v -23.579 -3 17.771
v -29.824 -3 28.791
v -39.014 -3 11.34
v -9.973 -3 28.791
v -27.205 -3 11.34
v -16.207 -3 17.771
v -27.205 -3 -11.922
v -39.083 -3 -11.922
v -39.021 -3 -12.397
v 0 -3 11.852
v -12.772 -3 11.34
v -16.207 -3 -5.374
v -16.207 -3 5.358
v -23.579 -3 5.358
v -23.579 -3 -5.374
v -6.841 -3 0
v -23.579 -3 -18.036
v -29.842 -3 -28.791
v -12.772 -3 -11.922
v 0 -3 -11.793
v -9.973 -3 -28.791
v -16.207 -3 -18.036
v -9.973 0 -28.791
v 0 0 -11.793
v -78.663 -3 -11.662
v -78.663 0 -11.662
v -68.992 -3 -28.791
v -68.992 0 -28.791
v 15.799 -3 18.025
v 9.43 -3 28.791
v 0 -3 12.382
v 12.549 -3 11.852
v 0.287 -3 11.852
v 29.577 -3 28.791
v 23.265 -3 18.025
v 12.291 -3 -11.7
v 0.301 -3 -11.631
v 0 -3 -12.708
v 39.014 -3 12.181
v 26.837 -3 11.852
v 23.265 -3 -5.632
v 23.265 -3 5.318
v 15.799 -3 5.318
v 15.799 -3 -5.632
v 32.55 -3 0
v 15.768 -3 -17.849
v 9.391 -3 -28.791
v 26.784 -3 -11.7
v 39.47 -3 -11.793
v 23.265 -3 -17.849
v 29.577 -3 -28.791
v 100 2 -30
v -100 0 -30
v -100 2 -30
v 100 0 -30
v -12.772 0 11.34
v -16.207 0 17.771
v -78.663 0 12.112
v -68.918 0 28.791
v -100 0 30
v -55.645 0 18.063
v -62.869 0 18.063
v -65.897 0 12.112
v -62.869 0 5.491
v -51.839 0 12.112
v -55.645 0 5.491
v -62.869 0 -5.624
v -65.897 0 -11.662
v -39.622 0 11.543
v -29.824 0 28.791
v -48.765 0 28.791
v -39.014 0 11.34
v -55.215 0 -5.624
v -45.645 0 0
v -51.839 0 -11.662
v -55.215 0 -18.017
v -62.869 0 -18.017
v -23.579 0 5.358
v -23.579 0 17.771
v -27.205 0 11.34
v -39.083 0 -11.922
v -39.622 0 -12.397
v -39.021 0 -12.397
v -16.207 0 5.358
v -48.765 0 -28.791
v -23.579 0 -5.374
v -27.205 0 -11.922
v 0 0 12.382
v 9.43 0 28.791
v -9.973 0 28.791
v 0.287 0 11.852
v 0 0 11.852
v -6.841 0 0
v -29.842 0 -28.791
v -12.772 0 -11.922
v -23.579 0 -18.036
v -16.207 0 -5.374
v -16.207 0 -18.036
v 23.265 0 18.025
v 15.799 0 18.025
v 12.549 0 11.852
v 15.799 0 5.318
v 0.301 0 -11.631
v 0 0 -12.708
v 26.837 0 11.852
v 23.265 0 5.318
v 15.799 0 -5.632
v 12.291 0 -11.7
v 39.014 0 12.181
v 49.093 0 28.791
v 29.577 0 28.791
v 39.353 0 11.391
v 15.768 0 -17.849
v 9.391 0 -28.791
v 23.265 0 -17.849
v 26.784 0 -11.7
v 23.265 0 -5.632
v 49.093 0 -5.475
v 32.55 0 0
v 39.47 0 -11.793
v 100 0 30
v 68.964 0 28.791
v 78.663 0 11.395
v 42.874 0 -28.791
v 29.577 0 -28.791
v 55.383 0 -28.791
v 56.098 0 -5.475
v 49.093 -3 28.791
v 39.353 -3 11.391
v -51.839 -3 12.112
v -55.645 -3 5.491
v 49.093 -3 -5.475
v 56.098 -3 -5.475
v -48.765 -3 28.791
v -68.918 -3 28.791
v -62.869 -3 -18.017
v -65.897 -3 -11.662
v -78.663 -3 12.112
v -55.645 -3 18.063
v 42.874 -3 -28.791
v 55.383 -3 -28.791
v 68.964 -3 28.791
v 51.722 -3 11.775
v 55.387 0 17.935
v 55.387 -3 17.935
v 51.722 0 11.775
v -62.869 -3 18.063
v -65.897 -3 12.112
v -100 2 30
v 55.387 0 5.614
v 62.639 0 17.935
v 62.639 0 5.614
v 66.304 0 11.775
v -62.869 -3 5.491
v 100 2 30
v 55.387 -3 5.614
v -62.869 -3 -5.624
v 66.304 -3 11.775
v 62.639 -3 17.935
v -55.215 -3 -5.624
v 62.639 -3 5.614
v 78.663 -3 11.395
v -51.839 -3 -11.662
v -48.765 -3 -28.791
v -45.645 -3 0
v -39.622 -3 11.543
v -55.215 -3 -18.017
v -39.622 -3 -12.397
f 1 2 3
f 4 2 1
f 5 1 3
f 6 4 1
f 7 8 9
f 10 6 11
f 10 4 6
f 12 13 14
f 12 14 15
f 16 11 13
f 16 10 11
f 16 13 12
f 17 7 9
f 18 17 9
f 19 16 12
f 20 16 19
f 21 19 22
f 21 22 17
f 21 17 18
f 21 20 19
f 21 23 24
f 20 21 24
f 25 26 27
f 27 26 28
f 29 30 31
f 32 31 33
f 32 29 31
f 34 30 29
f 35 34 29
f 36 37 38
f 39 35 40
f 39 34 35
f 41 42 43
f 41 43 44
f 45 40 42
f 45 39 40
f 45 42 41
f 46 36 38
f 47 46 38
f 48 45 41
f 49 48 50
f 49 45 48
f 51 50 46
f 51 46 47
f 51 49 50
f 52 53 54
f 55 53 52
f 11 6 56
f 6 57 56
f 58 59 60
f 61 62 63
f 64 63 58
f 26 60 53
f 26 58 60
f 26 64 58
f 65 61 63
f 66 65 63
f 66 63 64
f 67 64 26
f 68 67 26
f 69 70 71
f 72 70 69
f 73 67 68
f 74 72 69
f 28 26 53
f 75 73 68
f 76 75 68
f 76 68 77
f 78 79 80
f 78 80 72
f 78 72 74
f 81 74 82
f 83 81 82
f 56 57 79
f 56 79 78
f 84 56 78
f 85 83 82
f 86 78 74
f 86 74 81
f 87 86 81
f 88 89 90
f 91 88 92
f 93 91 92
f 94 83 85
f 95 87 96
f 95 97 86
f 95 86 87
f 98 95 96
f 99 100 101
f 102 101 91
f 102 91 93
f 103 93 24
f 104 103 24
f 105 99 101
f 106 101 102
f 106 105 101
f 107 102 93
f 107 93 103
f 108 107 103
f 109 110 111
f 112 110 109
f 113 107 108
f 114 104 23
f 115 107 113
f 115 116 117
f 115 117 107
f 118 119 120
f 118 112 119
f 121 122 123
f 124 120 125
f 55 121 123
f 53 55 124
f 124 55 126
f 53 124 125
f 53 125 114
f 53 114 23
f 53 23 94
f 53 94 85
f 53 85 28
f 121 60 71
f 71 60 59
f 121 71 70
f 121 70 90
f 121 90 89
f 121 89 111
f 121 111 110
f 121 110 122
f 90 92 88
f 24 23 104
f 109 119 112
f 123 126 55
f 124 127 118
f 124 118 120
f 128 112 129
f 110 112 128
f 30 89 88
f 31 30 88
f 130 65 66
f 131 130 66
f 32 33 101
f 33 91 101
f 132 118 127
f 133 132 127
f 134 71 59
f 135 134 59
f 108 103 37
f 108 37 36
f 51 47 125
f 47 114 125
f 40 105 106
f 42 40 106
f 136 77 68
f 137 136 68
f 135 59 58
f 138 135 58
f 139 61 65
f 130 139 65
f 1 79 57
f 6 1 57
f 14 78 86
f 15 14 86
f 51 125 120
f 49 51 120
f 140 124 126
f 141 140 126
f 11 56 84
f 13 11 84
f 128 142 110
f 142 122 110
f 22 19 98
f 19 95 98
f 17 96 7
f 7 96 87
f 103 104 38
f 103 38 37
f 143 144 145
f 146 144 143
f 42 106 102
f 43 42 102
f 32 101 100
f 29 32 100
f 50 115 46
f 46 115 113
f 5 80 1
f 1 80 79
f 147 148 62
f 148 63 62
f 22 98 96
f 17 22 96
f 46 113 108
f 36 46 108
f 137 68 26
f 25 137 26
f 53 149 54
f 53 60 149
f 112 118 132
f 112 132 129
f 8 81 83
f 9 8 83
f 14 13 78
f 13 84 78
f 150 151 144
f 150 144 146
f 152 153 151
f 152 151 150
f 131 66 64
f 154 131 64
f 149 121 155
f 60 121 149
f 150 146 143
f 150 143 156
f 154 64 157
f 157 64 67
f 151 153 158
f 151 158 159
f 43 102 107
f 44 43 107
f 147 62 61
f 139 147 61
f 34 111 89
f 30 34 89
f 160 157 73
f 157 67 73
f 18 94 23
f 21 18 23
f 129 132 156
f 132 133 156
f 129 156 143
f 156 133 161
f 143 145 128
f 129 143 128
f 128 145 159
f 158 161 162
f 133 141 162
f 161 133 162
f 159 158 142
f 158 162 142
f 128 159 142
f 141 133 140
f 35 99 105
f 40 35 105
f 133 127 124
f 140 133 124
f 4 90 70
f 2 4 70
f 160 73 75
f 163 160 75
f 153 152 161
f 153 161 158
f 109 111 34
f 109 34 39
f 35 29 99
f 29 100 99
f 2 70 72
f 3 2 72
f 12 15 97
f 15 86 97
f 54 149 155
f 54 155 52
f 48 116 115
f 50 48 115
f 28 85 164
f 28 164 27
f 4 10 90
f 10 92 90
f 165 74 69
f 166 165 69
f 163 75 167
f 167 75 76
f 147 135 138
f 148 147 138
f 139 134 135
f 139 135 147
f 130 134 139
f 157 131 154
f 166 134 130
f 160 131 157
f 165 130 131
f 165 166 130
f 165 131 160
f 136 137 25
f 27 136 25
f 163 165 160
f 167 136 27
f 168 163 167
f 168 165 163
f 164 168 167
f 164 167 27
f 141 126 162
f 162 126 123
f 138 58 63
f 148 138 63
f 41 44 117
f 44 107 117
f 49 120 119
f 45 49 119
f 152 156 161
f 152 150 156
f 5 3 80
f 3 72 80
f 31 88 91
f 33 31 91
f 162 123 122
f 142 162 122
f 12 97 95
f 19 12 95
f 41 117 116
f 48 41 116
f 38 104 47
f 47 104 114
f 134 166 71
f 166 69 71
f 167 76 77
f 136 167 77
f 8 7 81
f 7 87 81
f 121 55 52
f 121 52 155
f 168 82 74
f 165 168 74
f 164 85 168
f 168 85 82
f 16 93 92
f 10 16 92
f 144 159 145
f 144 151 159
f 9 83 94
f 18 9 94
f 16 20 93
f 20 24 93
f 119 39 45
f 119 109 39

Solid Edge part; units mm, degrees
sketch "Sketch1" plane through (0, 0, 0) normal (0, -1, 0) x (1, 0, 0)
  line L0 (-100, -30) -> (100, -30)
  line L1 (100, -30) -> (100, 30)
  line L2 (100, 30) -> (-100, 30)
  line L3 (-100, 30) -> (-100, -30)
  dimension "D1" = 200
  dimension "D2" = 60
extrude "Protrusion1" add sketch "Sketch1" against normal blind 2
sketch "Sketch2" plane through (0, 0, 0) normal (0, -1, 0) x (1, 0, 0)
  line L0 (-39.6222, 11.5432) -> (-48.7647, 28.7907)
  line L1 (-48.7647, 28.7907) -> (-68.9181, 28.7907)
  line L2 (-68.9181, 28.7907) -> (-78.6631, 12.1124)
  line L3 (-78.6631, 12.1124) -> (-65.8971, 12.1124)
  line L4 (-65.8971, 12.1124) -> (-62.8688, 18.0634)
  line L5 (-62.8688, 18.0634) -> (-55.6447, 18.0634)
  line L6 (-55.6447, 18.0634) -> (-51.8394, 12.1124)
  line L7 (-51.8394, 12.1124) -> (-55.6447, 5.4911)
  line L8 (-55.6447, 5.4911) -> (-62.8688, 5.4911)
  line L9 (-62.8688, 5.4911) -> (-62.8688, -5.6236)
  line L10 (-62.8688, -5.6236) -> (-55.2147, -5.6236)
  line L11 (-55.2147, -5.6236) -> (-51.8394, -11.6625)
  line L12 (-51.8394, -11.6625) -> (-55.2147, -18.0171)
  line L13 (-55.2147, -18.0171) -> (-62.8688, -18.0171)
  line L14 (-62.8688, -18.0171) -> (-65.8971, -11.6625)
  line L15 (-65.8971, -11.6625) -> (-78.6631, -11.6625)
  line L16 (-78.6631, -11.6625) -> (-68.9922, -28.7907)
  line L17 (-48.7647, -28.7907) -> (-68.9922, -28.7907)
  line L18 (-48.7647, -28.7907) -> (-39.6222, -12.3974)
  line L19 (-39.6222, -12.3974) -> (-45.6448, 0)
  line L20 (-45.6448, 0) -> (-39.6222, 11.5432)
  line L21 (-29.8239, 28.7907) -> (-39.0136, 11.3404)
  line L22 (-39.0136, 11.3404) -> (-27.2051, 11.3404)
  line L23 (-27.2051, 11.3404) -> (-23.5794, 17.7709)
  line L24 (-23.5794, 17.7709) -> (-16.2069, 17.7709)
  line L25 (-16.2069, 17.7709) -> (-12.7725, 11.3404)
  line L26 (-12.7725, 11.3404) -> (-16.2069, 5.3584)
  line L27 (-16.2069, 5.3584) -> (-23.5794, 5.3584)
  line L28 (-23.5794, 5.3584) -> (-23.5794, -5.3744)
  line L29 (-23.5794, -5.3744) -> (-16.2069, -5.3744)
  line L30 (-16.2069, -5.3744) -> (-12.7725, -11.9215)
  line L31 (-12.7725, -11.9215) -> (-16.2069, -18.0364)
  line L32 (-16.2069, -18.0364) -> (-23.5794, -18.0364)
  line L33 (-23.5794, -18.0364) -> (-27.2051, -11.9215)
  line L34 (-27.2051, -11.9215) -> (-39.0832, -11.9215)
  line L35 (-39.0832, -11.9215) -> (-39.0211, -12.3974)
  line L36 (-39.0211, -12.3974) -> (-29.8416, -28.7907)
  line L37 (-29.8416, -28.7907) -> (-9.9734, -28.7907)
  line L38 (-9.9734, -28.7907) -> (0, -11.7929)
  line L39 (0, -11.7929) -> (-6.8407, 0)
  line L40 (-6.8407, 0) -> (0, 11.8515)
  line L41 (0, 11.8515) -> (-9.9734, 28.7907)
  line L42 (-9.9734, 28.7907) -> (-29.8239, 28.7907)
  line L43 (9.4303, 28.7907) -> (0, 12.3815)
  line L44 (0, 12.3815) -> (0.2872, 11.8515)
  line L45 (0.2872, 11.8515) -> (12.5492, 11.8515)
  line L46 (12.5492, 11.8515) -> (15.7991, 18.0247)
  line L47 (15.7991, 18.0247) -> (23.265, 18.0247)
  line L48 (23.265, 18.0247) -> (26.8369, 11.8515)
  line L49 (26.8369, 11.8515) -> (23.265, 5.318)
  line L50 (23.265, 5.318) -> (15.7991, 5.318)
  line L51 (15.7991, 5.318) -> (15.7991, -5.632)
  line L52 (15.7991, -5.632) -> (23.265, -5.632)
  line L53 (23.265, -5.632) -> (26.7839, -11.7003)
  line L54 (26.7839, -11.7003) -> (23.265, -17.8487)
  line L55 (23.265, -17.8487) -> (15.768, -17.8487)
  line L56 (15.768, -17.8487) -> (12.2913, -11.7003)
  line L57 (0.3007, -11.6312) -> (12.2913, -11.7003)
  line L58 (0, -12.7084) -> (0.3007, -11.6312)
  line L59 (0, -12.7084) -> (9.391, -28.7907)
  line L60 (9.391, -28.7907) -> (29.5768, -28.7907)
  line L61 (29.5768, -28.7907) -> (39.4696, -11.7929)
  line L62 (39.4696, -11.7929) -> (32.5504, 0)
  line L63 (39.014, 12.1809) -> (32.5504, 0)
  line L64 (29.5768, 28.7907) -> (39.014, 12.1809)
  line L65 (29.5768, 28.7907) -> (9.4303, 28.7907)
  line L66 (39.3531, 11.3913) -> (49.0927, 28.7907)
  line L67 (68.964, 28.7907) -> (49.0927, 28.7907)
  line L68 (78.6631, 11.3946) -> (68.964, 28.7907)
  line L69 (55.3829, -28.7907) -> (78.6631, 11.3946)
  line L70 (42.8739, -28.7907) -> (55.3829, -28.7907)
  line L71 (56.0977, -5.4746) -> (42.8739, -28.7907)
  line L72 (49.0927, -5.4746) -> (56.0977, -5.4746)
  line L73 (49.0927, -5.4746) -> (39.3531, 11.3913)
  line L74 (51.7218, 11.7746) -> (55.3868, 5.6144)
  line L75 (55.3868, 5.6144) -> (62.6387, 5.6144)
  line L76 (62.6387, 5.6144) -> (66.3037, 11.7746)
  line L77 (66.3037, 11.7746) -> (62.6387, 17.9349)
  line L78 (62.6387, 17.9349) -> (55.3868, 17.9349)
  line L79 (55.3868, 17.9349) -> (51.7218, 11.7746)
extrude "ExtrudedProtrusion_3" add sketch "Sketch2" along normal blind 3
properties part number "BumbleB0912"
